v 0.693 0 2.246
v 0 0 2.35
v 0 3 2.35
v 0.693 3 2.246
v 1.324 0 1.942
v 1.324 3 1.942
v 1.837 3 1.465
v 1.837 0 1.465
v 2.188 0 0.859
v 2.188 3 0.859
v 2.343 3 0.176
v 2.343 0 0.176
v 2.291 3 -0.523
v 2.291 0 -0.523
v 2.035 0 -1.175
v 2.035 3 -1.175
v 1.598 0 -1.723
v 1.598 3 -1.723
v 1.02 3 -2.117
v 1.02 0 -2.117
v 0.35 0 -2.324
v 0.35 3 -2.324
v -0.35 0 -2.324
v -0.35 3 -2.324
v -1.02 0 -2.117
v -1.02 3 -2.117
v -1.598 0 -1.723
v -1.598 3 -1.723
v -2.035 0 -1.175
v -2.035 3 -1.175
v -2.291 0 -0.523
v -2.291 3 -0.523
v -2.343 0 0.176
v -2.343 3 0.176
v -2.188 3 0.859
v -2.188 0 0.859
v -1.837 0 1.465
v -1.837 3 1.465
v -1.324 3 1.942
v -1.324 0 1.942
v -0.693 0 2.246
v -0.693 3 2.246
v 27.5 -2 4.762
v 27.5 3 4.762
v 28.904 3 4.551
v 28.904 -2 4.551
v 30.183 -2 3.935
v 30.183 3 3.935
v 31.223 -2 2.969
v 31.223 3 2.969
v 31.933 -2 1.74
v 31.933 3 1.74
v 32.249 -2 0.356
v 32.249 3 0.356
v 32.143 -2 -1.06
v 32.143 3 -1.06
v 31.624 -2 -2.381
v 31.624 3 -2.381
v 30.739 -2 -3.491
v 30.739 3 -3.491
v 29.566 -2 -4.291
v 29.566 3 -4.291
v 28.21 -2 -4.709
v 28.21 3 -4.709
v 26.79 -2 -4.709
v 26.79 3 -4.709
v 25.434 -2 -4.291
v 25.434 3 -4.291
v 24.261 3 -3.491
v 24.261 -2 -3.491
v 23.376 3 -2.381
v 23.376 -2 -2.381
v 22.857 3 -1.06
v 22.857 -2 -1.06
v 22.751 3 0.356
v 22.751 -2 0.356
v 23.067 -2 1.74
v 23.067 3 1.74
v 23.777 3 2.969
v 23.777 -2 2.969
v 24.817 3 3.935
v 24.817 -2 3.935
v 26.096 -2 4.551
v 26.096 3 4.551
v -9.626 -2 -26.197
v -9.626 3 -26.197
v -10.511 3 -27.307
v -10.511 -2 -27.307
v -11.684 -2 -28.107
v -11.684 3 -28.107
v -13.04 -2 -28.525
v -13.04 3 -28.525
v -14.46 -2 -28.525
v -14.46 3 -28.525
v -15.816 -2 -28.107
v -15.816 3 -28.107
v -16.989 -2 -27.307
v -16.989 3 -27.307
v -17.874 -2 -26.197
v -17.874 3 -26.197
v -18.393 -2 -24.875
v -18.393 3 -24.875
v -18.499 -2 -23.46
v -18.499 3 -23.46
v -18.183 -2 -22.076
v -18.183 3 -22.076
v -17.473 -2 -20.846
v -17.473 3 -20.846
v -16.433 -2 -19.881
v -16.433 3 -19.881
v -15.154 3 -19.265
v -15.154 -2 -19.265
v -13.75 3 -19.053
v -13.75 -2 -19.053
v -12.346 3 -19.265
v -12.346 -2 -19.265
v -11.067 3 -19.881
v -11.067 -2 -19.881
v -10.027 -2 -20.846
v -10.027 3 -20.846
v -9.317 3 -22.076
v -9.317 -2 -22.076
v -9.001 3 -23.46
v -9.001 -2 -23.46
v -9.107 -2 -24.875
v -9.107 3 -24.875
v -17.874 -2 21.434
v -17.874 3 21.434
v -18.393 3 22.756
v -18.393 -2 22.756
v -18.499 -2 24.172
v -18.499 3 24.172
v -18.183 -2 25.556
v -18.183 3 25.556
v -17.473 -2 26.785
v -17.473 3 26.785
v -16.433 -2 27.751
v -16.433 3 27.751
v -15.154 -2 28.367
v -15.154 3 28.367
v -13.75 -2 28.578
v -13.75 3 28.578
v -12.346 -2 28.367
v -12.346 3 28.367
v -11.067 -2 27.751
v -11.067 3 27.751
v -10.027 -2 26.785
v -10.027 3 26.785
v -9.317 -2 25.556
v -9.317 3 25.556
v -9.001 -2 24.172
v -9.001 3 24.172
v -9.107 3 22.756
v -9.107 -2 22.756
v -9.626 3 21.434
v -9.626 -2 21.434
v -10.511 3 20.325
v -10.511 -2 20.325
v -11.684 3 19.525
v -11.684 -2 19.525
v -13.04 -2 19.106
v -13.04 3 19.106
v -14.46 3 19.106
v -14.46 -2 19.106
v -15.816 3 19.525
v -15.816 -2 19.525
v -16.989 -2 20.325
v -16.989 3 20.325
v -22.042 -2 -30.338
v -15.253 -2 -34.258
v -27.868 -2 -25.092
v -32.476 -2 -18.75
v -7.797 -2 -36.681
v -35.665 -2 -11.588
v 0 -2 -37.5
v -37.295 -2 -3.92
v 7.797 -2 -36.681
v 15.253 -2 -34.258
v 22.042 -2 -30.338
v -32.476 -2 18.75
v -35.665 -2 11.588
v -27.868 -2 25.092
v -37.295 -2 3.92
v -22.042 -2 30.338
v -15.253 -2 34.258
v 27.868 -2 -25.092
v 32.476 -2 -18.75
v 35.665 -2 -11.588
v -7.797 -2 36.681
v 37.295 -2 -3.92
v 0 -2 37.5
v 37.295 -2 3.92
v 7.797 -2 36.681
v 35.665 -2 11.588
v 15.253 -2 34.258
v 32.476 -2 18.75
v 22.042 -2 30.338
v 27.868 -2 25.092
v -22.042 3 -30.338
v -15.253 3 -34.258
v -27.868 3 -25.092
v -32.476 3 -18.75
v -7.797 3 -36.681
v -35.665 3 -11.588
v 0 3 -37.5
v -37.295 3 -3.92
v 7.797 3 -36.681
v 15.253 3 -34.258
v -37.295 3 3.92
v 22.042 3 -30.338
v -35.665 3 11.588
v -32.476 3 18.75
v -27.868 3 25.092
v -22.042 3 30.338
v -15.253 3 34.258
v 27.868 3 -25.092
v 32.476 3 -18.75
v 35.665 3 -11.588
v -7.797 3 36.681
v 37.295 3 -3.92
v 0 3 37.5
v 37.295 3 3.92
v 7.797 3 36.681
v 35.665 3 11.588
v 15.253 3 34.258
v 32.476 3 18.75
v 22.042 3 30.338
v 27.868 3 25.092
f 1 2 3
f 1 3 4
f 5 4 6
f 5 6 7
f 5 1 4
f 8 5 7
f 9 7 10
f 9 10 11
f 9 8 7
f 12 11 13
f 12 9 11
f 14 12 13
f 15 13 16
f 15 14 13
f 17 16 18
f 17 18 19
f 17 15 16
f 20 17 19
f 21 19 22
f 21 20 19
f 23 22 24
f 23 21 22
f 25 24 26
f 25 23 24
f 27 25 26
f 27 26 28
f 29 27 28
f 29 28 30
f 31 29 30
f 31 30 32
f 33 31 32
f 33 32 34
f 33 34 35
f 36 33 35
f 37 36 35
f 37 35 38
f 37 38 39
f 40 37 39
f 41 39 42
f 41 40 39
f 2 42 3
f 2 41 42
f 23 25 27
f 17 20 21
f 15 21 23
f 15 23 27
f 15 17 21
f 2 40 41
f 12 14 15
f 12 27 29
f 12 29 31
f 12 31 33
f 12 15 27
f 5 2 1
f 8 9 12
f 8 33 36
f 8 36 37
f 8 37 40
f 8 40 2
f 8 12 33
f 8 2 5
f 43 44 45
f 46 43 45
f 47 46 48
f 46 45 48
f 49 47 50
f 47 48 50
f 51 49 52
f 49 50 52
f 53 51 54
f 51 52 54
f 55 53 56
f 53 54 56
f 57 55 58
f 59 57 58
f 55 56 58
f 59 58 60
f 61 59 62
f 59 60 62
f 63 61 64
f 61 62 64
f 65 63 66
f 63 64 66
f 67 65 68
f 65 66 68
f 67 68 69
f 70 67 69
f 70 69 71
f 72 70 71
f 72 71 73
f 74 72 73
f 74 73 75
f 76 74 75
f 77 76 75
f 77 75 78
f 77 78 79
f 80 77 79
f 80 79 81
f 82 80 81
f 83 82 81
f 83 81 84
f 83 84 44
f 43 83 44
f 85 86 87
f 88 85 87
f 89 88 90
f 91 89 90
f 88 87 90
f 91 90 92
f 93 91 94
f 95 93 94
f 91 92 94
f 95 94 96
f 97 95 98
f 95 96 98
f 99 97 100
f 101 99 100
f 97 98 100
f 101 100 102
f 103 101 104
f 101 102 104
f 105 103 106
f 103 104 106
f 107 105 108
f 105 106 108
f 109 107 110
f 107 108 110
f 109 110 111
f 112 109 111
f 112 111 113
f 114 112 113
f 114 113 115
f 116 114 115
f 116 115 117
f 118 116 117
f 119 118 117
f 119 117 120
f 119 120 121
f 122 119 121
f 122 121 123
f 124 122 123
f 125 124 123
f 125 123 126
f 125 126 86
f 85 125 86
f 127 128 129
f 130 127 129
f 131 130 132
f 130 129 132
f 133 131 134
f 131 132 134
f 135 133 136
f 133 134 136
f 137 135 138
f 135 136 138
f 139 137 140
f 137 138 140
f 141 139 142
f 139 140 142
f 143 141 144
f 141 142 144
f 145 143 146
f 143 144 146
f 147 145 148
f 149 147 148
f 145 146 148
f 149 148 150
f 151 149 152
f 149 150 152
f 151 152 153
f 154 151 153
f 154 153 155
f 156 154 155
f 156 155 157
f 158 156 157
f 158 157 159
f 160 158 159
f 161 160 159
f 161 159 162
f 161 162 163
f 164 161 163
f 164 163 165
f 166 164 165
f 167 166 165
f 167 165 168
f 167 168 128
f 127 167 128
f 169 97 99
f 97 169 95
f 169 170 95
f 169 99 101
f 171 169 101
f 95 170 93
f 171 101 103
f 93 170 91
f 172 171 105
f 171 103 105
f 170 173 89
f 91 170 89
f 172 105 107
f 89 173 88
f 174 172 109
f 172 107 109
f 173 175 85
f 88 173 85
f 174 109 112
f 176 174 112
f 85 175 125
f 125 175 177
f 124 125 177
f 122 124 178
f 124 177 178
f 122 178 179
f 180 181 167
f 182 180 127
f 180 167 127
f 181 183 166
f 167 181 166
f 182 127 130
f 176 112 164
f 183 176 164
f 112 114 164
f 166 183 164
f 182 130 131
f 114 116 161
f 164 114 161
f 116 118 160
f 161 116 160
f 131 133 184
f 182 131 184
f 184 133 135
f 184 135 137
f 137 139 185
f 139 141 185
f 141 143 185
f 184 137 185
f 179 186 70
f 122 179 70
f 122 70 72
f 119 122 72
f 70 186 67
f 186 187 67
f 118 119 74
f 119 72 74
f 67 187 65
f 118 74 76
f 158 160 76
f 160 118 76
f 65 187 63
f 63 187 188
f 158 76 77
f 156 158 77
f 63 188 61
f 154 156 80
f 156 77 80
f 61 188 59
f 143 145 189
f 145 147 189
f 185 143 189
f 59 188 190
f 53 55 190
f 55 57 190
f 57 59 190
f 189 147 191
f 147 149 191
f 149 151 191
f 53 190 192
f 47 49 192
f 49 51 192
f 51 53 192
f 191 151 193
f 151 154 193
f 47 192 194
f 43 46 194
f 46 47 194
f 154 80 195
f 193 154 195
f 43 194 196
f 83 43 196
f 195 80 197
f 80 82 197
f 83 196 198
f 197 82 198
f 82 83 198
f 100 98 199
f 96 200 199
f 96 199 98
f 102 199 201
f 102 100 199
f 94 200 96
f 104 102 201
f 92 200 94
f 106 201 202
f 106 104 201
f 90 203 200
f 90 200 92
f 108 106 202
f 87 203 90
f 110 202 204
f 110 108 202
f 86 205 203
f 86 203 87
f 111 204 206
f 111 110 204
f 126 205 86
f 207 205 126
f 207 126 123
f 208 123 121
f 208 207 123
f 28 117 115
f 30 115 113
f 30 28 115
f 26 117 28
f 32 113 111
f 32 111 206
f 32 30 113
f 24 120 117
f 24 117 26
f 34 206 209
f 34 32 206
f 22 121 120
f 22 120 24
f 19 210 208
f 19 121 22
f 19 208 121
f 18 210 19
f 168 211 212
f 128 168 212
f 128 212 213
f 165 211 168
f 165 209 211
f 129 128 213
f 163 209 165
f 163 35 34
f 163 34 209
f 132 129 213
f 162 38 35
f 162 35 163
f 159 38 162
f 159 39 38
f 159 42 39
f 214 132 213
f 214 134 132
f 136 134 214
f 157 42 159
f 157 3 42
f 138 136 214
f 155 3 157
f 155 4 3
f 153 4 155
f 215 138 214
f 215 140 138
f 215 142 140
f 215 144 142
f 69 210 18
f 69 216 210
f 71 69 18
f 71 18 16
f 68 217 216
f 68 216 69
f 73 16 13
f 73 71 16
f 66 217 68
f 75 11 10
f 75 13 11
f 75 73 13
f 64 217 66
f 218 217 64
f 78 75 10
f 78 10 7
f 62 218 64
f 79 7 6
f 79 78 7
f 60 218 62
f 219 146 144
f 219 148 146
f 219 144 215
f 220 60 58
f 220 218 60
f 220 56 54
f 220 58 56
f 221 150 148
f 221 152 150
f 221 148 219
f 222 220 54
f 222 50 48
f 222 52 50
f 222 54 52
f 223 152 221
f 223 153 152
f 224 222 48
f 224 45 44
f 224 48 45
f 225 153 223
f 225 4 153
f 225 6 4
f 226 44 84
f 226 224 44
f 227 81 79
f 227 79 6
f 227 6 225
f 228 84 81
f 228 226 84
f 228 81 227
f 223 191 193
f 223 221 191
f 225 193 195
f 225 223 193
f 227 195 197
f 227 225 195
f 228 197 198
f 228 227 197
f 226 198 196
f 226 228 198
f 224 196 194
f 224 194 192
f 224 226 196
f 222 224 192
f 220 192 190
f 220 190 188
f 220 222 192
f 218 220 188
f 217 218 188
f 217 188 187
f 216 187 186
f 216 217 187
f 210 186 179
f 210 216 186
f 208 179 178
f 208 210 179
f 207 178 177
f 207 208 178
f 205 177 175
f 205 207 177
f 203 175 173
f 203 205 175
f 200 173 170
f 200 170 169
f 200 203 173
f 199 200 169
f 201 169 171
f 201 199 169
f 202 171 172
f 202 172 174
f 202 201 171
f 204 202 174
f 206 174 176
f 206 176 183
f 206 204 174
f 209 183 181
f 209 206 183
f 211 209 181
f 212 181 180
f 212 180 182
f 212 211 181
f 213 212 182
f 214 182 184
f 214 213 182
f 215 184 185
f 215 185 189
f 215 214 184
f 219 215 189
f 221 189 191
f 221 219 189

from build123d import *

# Parameters (mm, degrees)
SKETCH1_R           = 37.5
SKETCH1_R_2         = 2.35
BOSS_EXTRUDE1_DEPTH = 3
BOSS_EXTRUDE2_START = -2
SKETCH1_3_R         = 37.5
BOSS_EXTRUDE2_DEPTH = 2
SKETCH2_R           = 4.7625
CUT_EXTRUDE1_DEPTH  = 54.268189382
CIRPATTERN1_COUNT   = 3


with BuildPart() as part:
    # Sketch1 → Boss-Extrude1 (new body)
    with BuildSketch(Plane(origin=(0, 0, 0), x_dir=(1, 0, 0), z_dir=(0, 1, 0))):
        Circle(SKETCH1_R)
        Circle(SKETCH1_R_2, mode=Mode.SUBTRACT)
    extrude(amount=BOSS_EXTRUDE1_DEPTH)

    # Sketch1<3> → Boss-Extrude2 (add)
    with BuildSketch(Plane(origin=(0, 0, 0), x_dir=(1, 0, 0), z_dir=(0, 1, 0)).offset(BOSS_EXTRUDE2_START)):
        Circle(SKETCH1_3_R)
    extrude(amount=BOSS_EXTRUDE2_DEPTH)

    # Sketch2 → Cut-Extrude1 (cut, through all)
    with BuildSketch(Plane(origin=(0, 3, 0), x_dir=(1, 0, 0), z_dir=(0, 1, 0))):
        with Locations((27.5, 0)):
            Circle(SKETCH2_R)
    cut_extrude1 = extrude(amount=-CUT_EXTRUDE1_DEPTH, mode=Mode.SUBTRACT)

    # CirPattern1: Cut-Extrude1 ×3 about axis
    cirpattern1_axis = Axis((0, 3, 0), (0, 1, 0))
    for i in range(1, CIRPATTERN1_COUNT):
        add(cut_extrude1.rotate(cirpattern1_axis, i * 360 / CIRPATTERN1_COUNT), mode=Mode.SUBTRACT)


solid = part.part
